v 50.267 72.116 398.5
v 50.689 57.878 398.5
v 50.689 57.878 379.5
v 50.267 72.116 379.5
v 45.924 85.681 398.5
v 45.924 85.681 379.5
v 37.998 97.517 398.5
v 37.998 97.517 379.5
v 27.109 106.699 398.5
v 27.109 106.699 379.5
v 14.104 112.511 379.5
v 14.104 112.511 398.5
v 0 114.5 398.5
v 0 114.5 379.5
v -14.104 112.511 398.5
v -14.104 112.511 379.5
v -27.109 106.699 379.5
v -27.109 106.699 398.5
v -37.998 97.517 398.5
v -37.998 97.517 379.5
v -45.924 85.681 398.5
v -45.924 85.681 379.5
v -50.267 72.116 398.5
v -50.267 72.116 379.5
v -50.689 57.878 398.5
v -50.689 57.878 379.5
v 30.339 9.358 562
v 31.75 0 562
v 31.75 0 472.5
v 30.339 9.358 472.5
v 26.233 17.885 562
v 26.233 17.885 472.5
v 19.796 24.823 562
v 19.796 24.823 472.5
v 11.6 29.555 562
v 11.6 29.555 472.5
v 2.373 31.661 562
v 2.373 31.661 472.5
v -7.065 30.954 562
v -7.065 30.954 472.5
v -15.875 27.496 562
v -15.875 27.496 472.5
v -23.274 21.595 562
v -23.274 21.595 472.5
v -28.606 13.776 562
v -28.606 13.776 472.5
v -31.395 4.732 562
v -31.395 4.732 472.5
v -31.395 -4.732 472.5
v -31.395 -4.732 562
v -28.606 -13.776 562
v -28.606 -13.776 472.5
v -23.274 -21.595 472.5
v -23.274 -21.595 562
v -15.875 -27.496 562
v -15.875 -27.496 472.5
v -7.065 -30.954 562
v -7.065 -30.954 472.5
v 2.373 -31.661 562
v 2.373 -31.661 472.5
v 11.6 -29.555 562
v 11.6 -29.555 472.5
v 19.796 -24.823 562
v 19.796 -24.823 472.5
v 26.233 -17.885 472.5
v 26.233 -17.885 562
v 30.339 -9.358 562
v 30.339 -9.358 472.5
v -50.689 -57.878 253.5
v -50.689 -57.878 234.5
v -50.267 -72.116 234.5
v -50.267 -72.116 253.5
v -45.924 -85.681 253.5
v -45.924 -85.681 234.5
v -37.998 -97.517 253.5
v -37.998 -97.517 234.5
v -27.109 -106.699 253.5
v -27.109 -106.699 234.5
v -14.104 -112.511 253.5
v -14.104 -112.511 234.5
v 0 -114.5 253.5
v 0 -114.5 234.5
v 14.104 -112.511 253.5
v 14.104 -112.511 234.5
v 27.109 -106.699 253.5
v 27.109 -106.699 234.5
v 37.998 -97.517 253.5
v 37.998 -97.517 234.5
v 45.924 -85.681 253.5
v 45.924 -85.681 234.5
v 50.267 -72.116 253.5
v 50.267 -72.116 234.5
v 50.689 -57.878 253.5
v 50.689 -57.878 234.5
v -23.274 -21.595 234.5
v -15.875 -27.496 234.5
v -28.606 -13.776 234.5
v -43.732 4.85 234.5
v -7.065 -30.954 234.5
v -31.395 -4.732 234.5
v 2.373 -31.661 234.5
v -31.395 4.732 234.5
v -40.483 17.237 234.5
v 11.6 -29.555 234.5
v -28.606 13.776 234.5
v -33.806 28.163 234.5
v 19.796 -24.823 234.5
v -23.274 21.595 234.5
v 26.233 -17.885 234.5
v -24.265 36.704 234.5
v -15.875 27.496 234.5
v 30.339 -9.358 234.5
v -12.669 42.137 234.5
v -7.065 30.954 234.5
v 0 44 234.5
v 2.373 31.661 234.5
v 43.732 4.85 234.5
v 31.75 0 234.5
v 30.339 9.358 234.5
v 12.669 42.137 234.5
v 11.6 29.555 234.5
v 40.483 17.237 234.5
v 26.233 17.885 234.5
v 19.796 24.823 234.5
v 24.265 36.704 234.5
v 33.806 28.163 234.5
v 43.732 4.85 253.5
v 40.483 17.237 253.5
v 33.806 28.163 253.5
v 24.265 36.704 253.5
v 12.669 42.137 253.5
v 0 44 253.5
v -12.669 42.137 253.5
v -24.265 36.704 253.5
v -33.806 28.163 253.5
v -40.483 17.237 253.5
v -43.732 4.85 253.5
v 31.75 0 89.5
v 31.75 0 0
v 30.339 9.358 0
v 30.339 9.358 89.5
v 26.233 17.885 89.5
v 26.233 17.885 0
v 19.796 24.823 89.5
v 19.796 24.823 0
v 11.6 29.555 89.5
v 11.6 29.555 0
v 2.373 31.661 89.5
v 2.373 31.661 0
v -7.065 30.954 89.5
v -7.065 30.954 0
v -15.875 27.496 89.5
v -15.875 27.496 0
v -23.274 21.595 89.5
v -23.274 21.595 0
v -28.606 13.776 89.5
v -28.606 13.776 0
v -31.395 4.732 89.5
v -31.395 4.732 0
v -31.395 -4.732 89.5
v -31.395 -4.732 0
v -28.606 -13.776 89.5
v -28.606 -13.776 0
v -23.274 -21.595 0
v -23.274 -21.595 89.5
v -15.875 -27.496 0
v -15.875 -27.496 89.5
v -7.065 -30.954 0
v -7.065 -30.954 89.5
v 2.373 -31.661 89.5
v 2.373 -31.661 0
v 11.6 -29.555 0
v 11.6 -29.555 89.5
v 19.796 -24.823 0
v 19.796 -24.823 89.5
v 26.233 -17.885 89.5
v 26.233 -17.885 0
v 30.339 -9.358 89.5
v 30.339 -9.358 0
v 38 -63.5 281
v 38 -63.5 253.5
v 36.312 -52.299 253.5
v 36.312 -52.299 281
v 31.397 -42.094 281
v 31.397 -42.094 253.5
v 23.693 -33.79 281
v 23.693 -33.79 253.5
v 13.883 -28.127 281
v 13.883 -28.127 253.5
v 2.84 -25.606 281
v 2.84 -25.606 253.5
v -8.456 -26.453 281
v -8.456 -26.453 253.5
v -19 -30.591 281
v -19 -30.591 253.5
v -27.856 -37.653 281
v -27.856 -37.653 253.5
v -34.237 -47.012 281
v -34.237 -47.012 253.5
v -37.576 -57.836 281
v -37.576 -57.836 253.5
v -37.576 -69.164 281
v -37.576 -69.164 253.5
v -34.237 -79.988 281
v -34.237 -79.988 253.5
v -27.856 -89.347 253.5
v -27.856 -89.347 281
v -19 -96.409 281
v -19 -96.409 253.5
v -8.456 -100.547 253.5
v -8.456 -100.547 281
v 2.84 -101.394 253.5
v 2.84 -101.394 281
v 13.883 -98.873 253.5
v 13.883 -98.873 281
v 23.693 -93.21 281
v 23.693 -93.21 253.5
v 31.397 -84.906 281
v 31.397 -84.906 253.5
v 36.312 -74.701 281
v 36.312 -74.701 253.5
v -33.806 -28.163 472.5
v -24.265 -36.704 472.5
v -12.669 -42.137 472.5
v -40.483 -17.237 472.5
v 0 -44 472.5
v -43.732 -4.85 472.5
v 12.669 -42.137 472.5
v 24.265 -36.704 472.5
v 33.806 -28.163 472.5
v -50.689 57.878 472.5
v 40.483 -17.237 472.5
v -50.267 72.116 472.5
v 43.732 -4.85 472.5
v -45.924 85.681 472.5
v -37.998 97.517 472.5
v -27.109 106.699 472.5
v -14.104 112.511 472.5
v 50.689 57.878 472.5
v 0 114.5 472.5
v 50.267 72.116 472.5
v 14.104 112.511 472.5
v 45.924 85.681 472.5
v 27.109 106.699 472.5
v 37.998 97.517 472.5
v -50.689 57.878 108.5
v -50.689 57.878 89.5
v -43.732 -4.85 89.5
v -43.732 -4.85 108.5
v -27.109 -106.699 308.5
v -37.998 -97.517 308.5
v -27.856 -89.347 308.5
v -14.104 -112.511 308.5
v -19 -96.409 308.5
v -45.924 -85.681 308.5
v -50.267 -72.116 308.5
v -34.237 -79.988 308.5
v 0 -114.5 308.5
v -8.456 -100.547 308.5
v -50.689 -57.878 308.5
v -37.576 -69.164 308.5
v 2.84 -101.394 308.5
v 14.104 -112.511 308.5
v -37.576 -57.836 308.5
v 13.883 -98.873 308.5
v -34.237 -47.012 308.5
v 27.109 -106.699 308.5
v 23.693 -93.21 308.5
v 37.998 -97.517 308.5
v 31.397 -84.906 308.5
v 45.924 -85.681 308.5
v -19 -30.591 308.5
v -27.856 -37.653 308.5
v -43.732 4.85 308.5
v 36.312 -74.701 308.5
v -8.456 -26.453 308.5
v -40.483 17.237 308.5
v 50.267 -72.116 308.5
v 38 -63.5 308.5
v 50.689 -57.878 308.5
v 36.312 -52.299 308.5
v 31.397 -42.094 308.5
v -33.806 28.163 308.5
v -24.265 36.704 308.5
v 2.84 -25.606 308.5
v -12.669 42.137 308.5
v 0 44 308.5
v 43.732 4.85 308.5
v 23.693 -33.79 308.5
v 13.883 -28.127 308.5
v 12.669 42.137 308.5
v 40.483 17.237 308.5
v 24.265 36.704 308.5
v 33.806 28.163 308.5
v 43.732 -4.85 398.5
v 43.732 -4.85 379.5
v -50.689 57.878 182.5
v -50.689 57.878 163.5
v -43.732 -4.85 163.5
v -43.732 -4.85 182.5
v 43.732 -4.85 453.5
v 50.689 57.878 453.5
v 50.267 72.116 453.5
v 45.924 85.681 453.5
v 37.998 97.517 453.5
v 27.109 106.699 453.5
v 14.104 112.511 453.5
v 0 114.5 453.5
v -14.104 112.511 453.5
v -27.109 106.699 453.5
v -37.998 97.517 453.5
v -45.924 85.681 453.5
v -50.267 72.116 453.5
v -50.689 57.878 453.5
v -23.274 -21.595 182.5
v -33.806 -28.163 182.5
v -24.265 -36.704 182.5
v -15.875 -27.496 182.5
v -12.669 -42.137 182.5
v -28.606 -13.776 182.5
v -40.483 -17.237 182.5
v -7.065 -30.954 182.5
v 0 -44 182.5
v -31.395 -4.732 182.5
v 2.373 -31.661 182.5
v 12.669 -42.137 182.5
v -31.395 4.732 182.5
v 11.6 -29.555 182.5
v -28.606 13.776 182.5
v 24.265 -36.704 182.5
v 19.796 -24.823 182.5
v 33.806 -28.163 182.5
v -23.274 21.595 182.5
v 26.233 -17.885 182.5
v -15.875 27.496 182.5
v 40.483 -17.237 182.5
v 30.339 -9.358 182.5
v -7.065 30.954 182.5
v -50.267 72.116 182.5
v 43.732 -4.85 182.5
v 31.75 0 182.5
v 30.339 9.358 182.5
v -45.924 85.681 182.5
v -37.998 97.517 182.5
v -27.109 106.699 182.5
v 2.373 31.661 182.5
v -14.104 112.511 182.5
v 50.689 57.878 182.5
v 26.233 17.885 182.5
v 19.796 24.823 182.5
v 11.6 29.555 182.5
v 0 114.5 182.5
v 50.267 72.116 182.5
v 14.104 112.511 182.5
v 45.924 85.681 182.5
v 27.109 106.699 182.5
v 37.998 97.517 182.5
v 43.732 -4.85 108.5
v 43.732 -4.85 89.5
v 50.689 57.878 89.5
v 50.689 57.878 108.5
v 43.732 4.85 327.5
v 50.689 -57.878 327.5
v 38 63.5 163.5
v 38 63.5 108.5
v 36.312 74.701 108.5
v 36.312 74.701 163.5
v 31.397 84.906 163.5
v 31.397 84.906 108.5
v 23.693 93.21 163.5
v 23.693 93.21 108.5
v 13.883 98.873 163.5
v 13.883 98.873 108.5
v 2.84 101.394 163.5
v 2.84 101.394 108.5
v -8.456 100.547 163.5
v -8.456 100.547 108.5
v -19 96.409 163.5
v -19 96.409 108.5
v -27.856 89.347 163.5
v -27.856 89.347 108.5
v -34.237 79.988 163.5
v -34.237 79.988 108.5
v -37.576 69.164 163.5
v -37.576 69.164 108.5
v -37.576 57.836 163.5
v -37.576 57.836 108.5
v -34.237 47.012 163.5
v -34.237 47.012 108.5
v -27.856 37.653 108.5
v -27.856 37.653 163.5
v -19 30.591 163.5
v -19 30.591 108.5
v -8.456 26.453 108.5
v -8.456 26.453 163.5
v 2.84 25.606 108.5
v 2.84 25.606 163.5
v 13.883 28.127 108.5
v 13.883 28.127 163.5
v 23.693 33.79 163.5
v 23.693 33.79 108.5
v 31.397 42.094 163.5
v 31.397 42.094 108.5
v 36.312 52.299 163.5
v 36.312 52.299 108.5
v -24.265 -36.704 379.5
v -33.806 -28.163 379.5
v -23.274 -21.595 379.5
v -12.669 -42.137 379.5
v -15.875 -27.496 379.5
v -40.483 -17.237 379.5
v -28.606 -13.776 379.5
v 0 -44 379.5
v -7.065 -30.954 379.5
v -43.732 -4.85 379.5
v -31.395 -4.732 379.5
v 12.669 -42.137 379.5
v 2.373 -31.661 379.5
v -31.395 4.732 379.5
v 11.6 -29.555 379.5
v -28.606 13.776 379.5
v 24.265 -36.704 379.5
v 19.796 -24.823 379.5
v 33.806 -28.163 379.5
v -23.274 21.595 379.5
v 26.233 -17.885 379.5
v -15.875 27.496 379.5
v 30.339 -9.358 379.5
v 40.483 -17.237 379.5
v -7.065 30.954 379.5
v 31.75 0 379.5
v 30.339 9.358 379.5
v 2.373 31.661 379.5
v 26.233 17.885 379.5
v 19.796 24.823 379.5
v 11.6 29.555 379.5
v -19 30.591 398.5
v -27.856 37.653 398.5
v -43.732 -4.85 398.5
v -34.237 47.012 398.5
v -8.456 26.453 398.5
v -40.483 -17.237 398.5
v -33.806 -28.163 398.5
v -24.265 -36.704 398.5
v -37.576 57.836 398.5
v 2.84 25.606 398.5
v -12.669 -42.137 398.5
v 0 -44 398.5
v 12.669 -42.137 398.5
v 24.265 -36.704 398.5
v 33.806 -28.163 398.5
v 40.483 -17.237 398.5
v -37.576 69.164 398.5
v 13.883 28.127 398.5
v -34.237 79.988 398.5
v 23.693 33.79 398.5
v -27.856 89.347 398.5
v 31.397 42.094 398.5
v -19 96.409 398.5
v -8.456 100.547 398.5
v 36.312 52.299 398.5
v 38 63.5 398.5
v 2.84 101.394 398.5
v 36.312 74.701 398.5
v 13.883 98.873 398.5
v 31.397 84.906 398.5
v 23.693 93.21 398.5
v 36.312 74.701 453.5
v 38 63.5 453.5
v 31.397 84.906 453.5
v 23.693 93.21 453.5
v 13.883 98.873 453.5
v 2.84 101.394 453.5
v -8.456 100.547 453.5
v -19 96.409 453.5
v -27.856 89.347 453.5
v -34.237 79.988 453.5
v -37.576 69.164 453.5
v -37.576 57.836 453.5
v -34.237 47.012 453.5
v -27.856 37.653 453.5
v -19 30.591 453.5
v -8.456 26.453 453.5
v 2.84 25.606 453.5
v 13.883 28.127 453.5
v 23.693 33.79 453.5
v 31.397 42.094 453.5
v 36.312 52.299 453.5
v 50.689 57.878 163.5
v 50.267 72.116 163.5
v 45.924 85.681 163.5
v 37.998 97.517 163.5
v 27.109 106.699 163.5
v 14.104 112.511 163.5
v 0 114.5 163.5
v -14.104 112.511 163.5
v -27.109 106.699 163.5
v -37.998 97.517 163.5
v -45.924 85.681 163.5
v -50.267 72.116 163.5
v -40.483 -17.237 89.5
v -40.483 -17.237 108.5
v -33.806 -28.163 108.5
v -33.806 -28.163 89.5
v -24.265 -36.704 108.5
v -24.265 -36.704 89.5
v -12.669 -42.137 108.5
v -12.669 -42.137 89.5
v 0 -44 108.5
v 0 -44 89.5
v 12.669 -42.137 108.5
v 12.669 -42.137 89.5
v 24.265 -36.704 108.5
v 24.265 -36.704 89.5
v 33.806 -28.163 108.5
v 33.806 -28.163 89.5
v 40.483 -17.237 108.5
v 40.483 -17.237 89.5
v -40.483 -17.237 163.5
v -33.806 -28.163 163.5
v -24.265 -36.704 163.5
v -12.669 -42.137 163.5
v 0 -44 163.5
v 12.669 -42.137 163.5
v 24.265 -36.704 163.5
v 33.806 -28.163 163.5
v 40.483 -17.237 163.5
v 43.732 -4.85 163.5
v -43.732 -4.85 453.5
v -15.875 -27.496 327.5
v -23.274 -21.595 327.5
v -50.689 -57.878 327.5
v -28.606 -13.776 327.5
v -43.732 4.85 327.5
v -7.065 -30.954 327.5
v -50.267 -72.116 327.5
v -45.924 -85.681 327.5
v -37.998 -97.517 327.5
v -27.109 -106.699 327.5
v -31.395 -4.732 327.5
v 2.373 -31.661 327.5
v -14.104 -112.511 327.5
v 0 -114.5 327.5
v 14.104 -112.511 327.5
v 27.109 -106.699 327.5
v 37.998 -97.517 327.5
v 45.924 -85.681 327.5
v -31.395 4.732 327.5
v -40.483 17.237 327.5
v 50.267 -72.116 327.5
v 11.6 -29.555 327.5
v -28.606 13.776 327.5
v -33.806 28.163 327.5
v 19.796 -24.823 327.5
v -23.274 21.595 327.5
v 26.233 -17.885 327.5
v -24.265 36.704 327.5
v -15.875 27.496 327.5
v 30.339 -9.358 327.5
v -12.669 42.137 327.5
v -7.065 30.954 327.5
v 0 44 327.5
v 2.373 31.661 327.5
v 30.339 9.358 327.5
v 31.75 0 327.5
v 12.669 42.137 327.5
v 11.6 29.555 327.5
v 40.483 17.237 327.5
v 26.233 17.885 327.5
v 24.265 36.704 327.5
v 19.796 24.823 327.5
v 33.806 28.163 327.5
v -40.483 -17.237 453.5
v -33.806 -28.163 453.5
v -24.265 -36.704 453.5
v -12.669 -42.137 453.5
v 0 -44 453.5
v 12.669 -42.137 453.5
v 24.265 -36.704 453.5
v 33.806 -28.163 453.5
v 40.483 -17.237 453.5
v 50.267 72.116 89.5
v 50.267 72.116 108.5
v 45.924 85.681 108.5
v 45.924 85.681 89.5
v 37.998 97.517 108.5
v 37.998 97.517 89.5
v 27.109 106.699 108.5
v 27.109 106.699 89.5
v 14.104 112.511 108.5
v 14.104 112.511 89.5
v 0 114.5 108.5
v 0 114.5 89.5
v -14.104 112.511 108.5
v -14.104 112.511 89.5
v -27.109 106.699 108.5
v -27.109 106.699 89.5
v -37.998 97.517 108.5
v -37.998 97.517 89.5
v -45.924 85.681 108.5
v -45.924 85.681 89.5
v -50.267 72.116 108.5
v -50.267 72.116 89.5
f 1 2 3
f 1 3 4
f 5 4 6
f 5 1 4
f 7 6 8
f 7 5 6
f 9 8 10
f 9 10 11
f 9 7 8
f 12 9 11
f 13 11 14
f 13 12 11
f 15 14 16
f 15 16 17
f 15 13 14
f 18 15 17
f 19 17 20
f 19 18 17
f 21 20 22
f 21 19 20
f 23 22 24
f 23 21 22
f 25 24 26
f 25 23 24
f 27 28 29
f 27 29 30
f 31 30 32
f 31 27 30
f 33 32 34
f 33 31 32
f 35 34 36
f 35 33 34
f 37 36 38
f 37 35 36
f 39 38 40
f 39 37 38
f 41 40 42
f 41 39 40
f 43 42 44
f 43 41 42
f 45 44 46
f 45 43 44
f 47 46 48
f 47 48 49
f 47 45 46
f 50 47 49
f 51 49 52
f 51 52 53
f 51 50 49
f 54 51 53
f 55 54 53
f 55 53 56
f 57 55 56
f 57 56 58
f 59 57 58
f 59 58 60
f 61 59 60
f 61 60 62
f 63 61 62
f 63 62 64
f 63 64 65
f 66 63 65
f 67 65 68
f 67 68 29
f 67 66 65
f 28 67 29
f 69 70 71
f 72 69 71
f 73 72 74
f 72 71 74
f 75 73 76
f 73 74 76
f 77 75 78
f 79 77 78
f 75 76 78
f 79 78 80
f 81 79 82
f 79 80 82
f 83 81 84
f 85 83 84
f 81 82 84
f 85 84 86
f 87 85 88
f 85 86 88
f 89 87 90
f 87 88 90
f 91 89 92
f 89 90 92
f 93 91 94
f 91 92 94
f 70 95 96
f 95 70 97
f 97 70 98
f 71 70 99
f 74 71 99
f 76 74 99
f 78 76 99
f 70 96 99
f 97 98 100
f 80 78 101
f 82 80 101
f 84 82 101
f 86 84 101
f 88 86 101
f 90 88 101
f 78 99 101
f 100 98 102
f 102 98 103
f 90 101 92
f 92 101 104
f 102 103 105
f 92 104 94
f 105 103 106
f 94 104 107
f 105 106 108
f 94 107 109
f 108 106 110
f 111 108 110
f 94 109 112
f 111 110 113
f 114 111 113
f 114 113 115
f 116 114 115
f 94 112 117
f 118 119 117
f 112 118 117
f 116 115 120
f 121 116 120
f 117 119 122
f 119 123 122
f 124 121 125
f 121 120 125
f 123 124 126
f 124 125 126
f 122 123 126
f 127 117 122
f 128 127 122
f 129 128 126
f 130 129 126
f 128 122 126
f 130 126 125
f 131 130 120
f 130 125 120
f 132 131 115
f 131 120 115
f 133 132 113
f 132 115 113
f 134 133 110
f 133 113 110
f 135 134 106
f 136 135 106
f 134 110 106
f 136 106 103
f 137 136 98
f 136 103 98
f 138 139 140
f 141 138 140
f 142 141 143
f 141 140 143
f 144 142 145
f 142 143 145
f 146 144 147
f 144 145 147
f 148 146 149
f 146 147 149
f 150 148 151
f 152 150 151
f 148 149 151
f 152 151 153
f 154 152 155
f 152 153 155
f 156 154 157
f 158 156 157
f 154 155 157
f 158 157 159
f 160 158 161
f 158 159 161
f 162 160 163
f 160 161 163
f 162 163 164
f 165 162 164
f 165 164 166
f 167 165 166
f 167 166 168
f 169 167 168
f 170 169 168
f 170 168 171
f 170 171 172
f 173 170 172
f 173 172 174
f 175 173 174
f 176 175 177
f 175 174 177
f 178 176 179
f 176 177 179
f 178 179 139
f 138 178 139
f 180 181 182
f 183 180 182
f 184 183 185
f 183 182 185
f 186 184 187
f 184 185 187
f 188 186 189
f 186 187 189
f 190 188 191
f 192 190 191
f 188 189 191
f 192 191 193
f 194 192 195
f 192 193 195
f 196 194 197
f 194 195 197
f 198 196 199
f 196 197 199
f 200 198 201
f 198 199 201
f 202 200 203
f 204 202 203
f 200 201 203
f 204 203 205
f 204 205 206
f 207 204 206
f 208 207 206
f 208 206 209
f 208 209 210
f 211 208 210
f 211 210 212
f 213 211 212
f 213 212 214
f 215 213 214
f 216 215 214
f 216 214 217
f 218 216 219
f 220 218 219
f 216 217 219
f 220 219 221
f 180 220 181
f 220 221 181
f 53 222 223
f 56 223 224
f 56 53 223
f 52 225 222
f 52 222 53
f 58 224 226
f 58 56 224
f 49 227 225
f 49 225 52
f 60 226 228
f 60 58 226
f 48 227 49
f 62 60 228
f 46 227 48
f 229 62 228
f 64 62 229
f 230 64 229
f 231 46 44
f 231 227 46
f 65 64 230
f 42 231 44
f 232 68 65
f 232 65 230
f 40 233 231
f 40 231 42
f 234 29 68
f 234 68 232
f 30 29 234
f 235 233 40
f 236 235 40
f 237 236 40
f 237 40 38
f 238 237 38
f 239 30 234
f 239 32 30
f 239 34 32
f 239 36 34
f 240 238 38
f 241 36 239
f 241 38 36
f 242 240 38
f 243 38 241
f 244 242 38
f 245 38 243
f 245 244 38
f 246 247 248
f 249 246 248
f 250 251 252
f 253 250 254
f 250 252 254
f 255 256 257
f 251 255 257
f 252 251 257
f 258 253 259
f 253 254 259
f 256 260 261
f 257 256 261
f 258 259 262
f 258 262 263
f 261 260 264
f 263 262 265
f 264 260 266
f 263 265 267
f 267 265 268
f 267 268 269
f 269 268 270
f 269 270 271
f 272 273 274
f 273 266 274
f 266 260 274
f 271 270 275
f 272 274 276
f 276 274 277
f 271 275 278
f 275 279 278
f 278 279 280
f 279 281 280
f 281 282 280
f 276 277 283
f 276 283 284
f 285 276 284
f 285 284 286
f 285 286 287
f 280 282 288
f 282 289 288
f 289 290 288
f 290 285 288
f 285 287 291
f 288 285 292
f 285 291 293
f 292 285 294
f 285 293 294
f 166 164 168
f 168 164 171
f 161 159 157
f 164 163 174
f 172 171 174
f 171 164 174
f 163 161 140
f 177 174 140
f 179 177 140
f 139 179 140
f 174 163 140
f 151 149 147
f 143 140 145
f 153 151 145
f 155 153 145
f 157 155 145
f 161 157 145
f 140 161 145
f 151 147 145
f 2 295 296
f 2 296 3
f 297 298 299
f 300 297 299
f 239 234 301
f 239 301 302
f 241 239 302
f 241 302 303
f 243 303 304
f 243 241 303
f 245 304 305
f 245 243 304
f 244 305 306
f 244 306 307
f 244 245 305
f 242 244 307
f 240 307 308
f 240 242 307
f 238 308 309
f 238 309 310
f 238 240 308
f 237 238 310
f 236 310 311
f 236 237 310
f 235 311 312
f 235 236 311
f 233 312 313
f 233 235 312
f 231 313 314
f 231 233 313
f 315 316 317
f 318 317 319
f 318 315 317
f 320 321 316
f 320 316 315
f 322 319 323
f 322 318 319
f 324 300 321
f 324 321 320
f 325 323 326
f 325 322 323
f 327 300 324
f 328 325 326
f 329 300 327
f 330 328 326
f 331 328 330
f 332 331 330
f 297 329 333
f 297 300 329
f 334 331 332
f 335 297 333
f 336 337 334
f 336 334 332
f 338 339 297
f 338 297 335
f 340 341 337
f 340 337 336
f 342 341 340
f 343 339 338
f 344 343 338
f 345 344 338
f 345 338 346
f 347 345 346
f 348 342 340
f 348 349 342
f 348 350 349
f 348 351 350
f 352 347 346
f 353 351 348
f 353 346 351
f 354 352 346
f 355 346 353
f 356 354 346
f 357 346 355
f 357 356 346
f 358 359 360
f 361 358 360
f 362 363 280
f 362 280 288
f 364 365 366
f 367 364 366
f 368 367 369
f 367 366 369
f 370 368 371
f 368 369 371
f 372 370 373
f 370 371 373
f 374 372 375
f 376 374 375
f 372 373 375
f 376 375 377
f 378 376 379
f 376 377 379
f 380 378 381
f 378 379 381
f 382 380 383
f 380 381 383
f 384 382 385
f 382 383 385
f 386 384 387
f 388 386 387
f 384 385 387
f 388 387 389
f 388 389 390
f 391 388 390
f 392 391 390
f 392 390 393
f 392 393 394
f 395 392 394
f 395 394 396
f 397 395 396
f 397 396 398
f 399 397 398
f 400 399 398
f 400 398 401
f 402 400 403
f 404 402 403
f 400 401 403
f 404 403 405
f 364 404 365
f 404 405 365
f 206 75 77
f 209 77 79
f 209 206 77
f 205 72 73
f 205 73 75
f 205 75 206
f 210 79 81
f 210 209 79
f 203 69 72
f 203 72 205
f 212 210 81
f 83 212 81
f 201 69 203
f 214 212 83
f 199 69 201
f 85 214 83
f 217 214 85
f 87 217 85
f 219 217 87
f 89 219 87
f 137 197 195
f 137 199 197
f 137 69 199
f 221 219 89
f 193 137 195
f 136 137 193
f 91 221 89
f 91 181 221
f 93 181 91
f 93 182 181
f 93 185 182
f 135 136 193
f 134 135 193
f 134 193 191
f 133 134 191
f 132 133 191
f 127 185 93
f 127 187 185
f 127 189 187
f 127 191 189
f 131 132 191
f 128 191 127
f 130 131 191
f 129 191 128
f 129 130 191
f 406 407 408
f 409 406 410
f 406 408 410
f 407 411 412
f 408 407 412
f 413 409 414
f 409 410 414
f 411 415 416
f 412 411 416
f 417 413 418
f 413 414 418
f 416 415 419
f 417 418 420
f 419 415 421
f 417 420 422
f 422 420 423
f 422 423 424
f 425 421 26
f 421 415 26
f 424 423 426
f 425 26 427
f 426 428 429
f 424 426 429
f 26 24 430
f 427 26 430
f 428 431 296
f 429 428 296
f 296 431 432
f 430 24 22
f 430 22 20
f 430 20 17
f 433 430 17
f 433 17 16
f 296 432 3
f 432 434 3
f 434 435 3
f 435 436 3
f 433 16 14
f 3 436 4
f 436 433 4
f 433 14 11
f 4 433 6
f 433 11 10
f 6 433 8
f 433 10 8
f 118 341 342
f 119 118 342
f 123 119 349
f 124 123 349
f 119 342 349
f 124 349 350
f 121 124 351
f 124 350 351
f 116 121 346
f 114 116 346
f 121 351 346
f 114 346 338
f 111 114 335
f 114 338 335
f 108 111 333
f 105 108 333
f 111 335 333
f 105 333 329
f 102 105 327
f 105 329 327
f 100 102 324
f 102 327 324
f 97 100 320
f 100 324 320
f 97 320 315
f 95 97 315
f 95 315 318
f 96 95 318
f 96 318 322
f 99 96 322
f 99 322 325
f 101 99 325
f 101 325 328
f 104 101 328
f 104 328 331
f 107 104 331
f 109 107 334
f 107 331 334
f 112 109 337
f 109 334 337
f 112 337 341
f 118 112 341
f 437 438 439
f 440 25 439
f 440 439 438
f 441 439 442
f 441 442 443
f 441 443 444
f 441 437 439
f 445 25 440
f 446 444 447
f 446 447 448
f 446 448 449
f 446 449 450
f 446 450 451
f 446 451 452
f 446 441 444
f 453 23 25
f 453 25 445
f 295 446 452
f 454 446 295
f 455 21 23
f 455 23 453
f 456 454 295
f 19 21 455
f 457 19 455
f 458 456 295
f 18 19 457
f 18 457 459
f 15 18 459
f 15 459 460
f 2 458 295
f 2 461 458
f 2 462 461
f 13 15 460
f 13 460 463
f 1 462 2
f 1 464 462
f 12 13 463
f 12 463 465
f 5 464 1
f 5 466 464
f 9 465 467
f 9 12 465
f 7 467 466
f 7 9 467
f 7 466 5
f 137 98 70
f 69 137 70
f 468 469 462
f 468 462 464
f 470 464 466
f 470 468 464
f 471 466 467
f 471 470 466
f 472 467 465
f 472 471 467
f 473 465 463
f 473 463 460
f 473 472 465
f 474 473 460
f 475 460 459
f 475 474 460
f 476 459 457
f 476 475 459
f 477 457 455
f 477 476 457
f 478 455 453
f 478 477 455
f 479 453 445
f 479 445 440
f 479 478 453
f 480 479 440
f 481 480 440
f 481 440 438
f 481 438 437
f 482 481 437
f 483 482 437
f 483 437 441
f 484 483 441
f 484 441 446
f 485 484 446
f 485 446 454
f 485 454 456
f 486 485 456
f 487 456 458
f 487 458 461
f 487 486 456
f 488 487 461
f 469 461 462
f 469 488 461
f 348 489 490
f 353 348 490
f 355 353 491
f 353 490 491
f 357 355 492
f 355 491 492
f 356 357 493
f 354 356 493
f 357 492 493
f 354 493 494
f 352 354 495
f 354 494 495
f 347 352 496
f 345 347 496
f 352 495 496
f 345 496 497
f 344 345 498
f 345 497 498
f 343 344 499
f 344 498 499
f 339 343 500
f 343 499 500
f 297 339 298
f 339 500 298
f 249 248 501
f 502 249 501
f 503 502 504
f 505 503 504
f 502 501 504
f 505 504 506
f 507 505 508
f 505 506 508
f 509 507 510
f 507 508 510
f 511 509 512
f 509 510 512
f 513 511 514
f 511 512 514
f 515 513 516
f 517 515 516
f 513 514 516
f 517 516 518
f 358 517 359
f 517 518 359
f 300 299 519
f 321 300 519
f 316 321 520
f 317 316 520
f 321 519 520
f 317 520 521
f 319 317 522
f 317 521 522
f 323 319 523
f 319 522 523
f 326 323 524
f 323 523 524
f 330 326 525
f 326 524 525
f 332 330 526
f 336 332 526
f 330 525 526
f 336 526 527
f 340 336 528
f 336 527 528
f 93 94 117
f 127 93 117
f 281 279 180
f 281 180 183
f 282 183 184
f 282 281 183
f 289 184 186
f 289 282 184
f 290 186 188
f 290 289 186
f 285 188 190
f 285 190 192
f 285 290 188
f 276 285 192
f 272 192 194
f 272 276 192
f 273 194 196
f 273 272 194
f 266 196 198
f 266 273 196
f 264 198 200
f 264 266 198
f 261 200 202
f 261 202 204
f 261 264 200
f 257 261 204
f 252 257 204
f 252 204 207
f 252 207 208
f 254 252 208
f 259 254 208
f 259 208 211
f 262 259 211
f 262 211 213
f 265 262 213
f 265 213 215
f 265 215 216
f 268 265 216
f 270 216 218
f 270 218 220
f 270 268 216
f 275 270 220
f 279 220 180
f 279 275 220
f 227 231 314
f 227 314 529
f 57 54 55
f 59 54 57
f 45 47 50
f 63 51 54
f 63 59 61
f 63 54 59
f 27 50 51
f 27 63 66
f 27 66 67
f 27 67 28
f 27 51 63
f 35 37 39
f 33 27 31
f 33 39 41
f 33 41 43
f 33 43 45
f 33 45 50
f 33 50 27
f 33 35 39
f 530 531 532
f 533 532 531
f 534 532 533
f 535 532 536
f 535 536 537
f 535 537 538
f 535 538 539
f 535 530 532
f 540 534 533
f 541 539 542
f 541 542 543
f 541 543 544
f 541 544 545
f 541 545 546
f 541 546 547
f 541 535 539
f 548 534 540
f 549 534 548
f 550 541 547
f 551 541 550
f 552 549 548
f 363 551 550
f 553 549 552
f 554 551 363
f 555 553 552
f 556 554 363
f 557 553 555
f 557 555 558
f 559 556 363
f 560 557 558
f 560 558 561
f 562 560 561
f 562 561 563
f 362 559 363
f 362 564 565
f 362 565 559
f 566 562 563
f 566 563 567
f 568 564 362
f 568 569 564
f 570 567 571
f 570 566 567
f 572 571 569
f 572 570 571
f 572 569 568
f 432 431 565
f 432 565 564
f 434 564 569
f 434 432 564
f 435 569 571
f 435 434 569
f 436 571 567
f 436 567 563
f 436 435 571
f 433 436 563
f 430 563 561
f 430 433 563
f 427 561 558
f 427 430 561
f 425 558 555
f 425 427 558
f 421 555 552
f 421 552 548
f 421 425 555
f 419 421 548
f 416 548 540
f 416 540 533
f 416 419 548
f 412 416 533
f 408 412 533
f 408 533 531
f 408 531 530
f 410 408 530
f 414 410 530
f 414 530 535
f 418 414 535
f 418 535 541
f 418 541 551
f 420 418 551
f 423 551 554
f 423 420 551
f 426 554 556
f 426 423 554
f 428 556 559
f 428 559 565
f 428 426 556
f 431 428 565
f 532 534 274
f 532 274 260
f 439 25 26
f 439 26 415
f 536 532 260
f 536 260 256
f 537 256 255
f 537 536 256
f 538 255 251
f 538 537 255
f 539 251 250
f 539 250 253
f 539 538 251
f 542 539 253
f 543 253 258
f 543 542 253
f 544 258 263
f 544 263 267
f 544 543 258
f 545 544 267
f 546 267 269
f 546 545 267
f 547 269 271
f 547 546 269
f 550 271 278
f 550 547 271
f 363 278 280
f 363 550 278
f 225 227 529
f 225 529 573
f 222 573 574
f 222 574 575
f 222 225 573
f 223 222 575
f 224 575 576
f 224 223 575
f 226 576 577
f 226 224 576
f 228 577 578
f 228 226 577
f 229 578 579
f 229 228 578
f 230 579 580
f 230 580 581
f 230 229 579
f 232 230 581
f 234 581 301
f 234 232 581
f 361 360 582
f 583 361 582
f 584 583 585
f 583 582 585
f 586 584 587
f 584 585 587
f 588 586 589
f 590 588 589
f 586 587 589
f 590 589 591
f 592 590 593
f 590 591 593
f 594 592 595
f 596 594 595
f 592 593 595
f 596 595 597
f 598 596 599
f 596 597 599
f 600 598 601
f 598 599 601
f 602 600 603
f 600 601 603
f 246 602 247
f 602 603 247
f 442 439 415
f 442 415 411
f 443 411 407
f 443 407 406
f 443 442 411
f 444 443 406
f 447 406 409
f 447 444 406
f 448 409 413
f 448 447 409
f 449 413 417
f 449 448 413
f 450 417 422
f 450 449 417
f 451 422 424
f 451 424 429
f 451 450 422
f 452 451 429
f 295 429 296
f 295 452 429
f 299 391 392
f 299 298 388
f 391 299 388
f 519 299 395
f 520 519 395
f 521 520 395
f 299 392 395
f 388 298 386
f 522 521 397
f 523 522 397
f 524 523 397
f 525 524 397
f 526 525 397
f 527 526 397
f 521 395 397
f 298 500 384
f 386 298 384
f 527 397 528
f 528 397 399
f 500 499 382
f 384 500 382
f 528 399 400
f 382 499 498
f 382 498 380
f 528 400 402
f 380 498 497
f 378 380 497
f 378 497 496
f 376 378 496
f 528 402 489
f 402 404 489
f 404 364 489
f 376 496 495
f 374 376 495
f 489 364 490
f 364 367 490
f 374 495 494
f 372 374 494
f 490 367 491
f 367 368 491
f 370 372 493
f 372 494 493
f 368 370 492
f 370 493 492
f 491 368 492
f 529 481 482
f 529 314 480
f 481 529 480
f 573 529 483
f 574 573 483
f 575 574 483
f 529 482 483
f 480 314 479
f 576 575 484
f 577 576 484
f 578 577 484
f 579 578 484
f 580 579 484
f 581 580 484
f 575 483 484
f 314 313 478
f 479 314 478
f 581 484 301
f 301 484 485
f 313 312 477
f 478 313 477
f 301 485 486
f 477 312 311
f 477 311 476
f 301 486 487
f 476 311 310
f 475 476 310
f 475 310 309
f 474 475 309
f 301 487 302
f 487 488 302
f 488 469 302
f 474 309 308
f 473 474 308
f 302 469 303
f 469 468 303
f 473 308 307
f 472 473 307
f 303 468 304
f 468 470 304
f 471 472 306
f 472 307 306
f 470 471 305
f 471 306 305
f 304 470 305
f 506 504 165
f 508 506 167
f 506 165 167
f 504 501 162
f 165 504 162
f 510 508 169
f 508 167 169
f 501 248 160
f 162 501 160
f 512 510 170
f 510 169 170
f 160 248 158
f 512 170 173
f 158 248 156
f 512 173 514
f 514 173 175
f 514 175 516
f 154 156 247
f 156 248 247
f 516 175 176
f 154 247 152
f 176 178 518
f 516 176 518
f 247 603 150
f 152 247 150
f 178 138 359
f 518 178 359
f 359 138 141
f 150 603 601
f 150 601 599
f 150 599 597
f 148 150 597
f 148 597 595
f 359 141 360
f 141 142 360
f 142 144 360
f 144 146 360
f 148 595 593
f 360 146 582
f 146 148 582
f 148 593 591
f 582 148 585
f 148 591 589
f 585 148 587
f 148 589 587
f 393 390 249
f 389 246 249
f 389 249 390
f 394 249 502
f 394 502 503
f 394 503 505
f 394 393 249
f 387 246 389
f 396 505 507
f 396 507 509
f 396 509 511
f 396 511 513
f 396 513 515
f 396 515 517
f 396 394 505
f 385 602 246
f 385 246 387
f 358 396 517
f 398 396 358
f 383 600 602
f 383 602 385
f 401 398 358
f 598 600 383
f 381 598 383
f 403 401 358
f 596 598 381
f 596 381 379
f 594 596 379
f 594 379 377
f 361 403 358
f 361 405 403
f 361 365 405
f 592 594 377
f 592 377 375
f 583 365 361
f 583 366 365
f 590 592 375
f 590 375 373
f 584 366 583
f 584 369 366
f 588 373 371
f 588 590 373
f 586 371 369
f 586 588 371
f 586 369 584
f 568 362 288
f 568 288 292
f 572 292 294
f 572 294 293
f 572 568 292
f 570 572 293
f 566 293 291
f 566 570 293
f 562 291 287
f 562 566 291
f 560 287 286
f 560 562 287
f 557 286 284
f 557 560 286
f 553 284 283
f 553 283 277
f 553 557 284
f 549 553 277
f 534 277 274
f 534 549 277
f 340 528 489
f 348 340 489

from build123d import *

# Parameters (mm, degrees)
SKETCH1_R           = 31.75
BOSS_EXTRUDE1_DEPTH = 89.5
BOSS_EXTRUDE2_DEPTH = 19
SKETCH3_R           = 38
BOSS_EXTRUDE3_DEPTH = 55
BOSS_EXTRUDE4_DEPTH = 19
SKETCH6_R           = 31.75
BOSS_EXTRUDE5_DEPTH = 52
BOSS_EXTRUDE6_DEPTH = 19
SKETCH8_R           = 38
BOSS_EXTRUDE7_DEPTH = 27.5


with BuildPart() as part:
    # Sketch1 → Boss-Extrude1 (new body)
    with BuildSketch(Plane.XY):
        Circle(SKETCH1_R)
    extrude(amount=BOSS_EXTRUDE1_DEPTH)

    # Sketch2 → Boss-Extrude2 (add)
    with BuildSketch(Plane.XY.offset(89.5)):
        with BuildLine():
            Line((-50.689176209, 57.877952756), (-43.731838298, -4.850393701))
            ThreePointArc((-43.731838298, -4.850393701), (0, -44), (43.731838298, -4.850393701))
            Line((43.731838298, -4.850393701), (50.689176209, 57.877952756))
            ThreePointArc((50.689176209, 57.877952756), (0, 114.5), (-50.689176209, 57.877952756))
        make_face()
    extrude(amount=BOSS_EXTRUDE2_DEPTH)

    # Sketch3 → Boss-Extrude3 (add)
    with BuildSketch(Plane.XY.offset(108.5)):
        with Locations((0, 63.5)):
            Circle(SKETCH3_R)
    extrude(amount=BOSS_EXTRUDE3_DEPTH)

    # Sketch5 → Boss-Extrude4 (add)
    with BuildSketch(Plane.XY.offset(163.5)):
        with BuildLine():
            Line((-50.689176209, 57.877952756), (-43.731838298, -4.850393701))
            ThreePointArc((-43.731838298, -4.850393701), (0, -44), (43.731838298, -4.850393701))
            Line((43.731838298, -4.850393701), (50.689176209, 57.877952756))
            ThreePointArc((50.689176209, 57.877952756), (0, 114.5), (-50.689176209, 57.877952756))
        make_face()
    extrude(amount=BOSS_EXTRUDE4_DEPTH)

    # Sketch6 → Boss-Extrude5 (add)
    with BuildSketch(Plane.XY.offset(182.5)):
        Circle(SKETCH6_R)
    extrude(amount=BOSS_EXTRUDE5_DEPTH)

    # Sketch7 → Boss-Extrude6 (add)
    with BuildSketch(Plane.XY.offset(234.5)):
        with BuildLine():
            Line((50.689176209, -57.877952756), (43.731838298, 4.850393701))
            ThreePointArc((43.731838298, 4.850393701), (0, 44), (-43.731838298, 4.850393701))
            Line((-43.731838298, 4.850393701), (-50.689176209, -57.877952756))
            ThreePointArc((-50.689176209, -57.877952756), (0, -114.5), (50.689176209, -57.877952756))
        make_face()
    extrude(amount=BOSS_EXTRUDE6_DEPTH)

    # Sketch8 → Boss-Extrude7 (add)
    with BuildSketch(Plane.XY.offset(253.5)):
        with Locations((0, -63.5)):
            Circle(SKETCH8_R)
    extrude(amount=BOSS_EXTRUDE7_DEPTH)

    # Mirror3: part across plane


with BuildPart() as part_1:
    add(part.part)
    add(part.part.mirror(Plane.XY.offset(281)))


solid = part_1.part
